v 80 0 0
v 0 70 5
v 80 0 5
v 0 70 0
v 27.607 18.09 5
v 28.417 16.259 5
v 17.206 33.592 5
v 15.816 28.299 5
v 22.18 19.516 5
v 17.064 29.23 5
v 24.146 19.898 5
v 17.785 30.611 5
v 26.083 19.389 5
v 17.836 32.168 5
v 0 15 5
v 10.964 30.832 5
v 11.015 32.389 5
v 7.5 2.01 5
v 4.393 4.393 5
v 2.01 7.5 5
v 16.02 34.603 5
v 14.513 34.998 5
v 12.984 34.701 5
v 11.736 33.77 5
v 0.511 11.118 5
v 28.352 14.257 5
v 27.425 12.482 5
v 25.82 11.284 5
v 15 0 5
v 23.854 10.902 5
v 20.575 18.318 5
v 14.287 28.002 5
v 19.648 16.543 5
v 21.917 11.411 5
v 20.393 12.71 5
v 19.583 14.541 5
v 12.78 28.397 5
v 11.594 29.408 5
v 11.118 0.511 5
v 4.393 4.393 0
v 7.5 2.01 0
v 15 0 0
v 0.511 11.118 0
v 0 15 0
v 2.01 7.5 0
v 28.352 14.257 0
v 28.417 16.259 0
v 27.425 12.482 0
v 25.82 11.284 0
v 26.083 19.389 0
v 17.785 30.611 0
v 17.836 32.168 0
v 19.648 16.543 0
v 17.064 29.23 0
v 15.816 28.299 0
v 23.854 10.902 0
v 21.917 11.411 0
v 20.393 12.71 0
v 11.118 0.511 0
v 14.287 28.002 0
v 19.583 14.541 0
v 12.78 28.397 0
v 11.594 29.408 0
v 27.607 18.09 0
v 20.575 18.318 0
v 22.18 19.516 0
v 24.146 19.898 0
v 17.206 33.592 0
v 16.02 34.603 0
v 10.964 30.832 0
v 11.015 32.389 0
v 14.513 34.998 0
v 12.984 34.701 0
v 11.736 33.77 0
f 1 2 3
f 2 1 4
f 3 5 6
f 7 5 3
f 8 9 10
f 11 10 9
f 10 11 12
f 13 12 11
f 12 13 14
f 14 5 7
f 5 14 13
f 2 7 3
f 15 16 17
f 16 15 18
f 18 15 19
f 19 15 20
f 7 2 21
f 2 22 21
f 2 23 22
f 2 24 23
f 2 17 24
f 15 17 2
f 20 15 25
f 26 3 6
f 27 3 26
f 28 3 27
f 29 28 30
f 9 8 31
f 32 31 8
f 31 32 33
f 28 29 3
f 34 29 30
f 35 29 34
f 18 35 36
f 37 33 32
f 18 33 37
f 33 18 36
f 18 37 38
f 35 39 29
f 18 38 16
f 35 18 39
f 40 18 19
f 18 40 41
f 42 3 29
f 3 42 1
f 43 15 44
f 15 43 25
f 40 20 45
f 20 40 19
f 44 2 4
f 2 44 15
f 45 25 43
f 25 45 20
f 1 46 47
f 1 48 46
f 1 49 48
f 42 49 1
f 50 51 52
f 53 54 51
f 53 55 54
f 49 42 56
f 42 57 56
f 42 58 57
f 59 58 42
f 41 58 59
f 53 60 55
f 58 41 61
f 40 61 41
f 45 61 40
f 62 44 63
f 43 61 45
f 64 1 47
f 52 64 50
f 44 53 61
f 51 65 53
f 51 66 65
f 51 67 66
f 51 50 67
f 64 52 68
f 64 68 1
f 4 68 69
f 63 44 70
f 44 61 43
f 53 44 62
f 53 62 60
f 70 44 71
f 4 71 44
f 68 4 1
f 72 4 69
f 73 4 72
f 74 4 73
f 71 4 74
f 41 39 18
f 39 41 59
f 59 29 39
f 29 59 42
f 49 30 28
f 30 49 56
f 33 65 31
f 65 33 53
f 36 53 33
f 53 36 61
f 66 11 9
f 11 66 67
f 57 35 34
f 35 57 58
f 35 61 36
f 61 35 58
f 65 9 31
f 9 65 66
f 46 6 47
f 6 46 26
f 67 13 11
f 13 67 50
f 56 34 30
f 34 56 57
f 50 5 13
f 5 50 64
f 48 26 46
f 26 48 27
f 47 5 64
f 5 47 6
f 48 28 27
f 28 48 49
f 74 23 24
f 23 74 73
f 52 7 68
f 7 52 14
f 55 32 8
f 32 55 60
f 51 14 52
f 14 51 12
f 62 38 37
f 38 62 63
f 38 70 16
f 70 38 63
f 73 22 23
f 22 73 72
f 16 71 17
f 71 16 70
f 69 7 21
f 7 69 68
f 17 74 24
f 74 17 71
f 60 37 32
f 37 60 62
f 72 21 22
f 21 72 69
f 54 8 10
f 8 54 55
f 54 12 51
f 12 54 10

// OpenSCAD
$fn = 32;

// ----------------------------------------------------------------------
// Bracket plate: corner pad 80 x 70, fillet R15
// ----------------------------------------------------------------------

// --- parameters (mm) ---
hole_r = 3.5;             // bolt hole radius
plate_t = 5;              // plate thickness, Z (extrusion height)
leg_a = 80;               // base leg
leg_b = 70;               // height leg
fillet_r = 15;            // right-angle fillet radius
fit_tol = 0.1;            // declared fit tolerance (prompt contract)
free_tol = 0.3;           // declared free tolerance (prompt contract)

hole_d1 = 2 * hole_r + 2;
hole_d2 = 2 * hole_r;

profile = [[15, 0], [80, 0], [0, 70], [0, 15], [0.511, 11.118], [2.01, 7.5], [4.393, 4.393], [7.5, 2.01], [11.118, 0.511]];  // primary outline, 9 points, counter clockwise
void_1 = [[28.417, 16.259], [27.607, 18.09], [26.083, 19.389], [24.146, 19.898], [22.18, 19.516], [20.575, 18.318], [19.648, 16.543], [19.583, 14.541], [20.393, 12.71], [21.917, 11.411], [23.854, 10.902], [25.82, 11.284], [27.425, 12.482], [28.352, 14.257]];  // mount hole 1, 14 points
void_2 = [[17.836, 32.168], [17.206, 33.592], [16.02, 34.603], [14.513, 34.998], [12.984, 34.701], [11.736, 33.77], [11.015, 32.389], [10.964, 30.832], [11.594, 29.408], [12.78, 28.397], [14.287, 28.002], [15.816, 28.299], [17.064, 29.23], [17.785, 30.611]];  // mount hole 2, 14 points

// --- the one profile operation ---
difference() {
  linear_extrude(height = plate_t) polygon(points = profile);
  translate([0, 0, -1])
    linear_extrude(height = plate_t + 2) polygon(points = void_1);
  translate([0, 0, -1])
    linear_extrude(height = plate_t + 2) polygon(points = void_2);
}
